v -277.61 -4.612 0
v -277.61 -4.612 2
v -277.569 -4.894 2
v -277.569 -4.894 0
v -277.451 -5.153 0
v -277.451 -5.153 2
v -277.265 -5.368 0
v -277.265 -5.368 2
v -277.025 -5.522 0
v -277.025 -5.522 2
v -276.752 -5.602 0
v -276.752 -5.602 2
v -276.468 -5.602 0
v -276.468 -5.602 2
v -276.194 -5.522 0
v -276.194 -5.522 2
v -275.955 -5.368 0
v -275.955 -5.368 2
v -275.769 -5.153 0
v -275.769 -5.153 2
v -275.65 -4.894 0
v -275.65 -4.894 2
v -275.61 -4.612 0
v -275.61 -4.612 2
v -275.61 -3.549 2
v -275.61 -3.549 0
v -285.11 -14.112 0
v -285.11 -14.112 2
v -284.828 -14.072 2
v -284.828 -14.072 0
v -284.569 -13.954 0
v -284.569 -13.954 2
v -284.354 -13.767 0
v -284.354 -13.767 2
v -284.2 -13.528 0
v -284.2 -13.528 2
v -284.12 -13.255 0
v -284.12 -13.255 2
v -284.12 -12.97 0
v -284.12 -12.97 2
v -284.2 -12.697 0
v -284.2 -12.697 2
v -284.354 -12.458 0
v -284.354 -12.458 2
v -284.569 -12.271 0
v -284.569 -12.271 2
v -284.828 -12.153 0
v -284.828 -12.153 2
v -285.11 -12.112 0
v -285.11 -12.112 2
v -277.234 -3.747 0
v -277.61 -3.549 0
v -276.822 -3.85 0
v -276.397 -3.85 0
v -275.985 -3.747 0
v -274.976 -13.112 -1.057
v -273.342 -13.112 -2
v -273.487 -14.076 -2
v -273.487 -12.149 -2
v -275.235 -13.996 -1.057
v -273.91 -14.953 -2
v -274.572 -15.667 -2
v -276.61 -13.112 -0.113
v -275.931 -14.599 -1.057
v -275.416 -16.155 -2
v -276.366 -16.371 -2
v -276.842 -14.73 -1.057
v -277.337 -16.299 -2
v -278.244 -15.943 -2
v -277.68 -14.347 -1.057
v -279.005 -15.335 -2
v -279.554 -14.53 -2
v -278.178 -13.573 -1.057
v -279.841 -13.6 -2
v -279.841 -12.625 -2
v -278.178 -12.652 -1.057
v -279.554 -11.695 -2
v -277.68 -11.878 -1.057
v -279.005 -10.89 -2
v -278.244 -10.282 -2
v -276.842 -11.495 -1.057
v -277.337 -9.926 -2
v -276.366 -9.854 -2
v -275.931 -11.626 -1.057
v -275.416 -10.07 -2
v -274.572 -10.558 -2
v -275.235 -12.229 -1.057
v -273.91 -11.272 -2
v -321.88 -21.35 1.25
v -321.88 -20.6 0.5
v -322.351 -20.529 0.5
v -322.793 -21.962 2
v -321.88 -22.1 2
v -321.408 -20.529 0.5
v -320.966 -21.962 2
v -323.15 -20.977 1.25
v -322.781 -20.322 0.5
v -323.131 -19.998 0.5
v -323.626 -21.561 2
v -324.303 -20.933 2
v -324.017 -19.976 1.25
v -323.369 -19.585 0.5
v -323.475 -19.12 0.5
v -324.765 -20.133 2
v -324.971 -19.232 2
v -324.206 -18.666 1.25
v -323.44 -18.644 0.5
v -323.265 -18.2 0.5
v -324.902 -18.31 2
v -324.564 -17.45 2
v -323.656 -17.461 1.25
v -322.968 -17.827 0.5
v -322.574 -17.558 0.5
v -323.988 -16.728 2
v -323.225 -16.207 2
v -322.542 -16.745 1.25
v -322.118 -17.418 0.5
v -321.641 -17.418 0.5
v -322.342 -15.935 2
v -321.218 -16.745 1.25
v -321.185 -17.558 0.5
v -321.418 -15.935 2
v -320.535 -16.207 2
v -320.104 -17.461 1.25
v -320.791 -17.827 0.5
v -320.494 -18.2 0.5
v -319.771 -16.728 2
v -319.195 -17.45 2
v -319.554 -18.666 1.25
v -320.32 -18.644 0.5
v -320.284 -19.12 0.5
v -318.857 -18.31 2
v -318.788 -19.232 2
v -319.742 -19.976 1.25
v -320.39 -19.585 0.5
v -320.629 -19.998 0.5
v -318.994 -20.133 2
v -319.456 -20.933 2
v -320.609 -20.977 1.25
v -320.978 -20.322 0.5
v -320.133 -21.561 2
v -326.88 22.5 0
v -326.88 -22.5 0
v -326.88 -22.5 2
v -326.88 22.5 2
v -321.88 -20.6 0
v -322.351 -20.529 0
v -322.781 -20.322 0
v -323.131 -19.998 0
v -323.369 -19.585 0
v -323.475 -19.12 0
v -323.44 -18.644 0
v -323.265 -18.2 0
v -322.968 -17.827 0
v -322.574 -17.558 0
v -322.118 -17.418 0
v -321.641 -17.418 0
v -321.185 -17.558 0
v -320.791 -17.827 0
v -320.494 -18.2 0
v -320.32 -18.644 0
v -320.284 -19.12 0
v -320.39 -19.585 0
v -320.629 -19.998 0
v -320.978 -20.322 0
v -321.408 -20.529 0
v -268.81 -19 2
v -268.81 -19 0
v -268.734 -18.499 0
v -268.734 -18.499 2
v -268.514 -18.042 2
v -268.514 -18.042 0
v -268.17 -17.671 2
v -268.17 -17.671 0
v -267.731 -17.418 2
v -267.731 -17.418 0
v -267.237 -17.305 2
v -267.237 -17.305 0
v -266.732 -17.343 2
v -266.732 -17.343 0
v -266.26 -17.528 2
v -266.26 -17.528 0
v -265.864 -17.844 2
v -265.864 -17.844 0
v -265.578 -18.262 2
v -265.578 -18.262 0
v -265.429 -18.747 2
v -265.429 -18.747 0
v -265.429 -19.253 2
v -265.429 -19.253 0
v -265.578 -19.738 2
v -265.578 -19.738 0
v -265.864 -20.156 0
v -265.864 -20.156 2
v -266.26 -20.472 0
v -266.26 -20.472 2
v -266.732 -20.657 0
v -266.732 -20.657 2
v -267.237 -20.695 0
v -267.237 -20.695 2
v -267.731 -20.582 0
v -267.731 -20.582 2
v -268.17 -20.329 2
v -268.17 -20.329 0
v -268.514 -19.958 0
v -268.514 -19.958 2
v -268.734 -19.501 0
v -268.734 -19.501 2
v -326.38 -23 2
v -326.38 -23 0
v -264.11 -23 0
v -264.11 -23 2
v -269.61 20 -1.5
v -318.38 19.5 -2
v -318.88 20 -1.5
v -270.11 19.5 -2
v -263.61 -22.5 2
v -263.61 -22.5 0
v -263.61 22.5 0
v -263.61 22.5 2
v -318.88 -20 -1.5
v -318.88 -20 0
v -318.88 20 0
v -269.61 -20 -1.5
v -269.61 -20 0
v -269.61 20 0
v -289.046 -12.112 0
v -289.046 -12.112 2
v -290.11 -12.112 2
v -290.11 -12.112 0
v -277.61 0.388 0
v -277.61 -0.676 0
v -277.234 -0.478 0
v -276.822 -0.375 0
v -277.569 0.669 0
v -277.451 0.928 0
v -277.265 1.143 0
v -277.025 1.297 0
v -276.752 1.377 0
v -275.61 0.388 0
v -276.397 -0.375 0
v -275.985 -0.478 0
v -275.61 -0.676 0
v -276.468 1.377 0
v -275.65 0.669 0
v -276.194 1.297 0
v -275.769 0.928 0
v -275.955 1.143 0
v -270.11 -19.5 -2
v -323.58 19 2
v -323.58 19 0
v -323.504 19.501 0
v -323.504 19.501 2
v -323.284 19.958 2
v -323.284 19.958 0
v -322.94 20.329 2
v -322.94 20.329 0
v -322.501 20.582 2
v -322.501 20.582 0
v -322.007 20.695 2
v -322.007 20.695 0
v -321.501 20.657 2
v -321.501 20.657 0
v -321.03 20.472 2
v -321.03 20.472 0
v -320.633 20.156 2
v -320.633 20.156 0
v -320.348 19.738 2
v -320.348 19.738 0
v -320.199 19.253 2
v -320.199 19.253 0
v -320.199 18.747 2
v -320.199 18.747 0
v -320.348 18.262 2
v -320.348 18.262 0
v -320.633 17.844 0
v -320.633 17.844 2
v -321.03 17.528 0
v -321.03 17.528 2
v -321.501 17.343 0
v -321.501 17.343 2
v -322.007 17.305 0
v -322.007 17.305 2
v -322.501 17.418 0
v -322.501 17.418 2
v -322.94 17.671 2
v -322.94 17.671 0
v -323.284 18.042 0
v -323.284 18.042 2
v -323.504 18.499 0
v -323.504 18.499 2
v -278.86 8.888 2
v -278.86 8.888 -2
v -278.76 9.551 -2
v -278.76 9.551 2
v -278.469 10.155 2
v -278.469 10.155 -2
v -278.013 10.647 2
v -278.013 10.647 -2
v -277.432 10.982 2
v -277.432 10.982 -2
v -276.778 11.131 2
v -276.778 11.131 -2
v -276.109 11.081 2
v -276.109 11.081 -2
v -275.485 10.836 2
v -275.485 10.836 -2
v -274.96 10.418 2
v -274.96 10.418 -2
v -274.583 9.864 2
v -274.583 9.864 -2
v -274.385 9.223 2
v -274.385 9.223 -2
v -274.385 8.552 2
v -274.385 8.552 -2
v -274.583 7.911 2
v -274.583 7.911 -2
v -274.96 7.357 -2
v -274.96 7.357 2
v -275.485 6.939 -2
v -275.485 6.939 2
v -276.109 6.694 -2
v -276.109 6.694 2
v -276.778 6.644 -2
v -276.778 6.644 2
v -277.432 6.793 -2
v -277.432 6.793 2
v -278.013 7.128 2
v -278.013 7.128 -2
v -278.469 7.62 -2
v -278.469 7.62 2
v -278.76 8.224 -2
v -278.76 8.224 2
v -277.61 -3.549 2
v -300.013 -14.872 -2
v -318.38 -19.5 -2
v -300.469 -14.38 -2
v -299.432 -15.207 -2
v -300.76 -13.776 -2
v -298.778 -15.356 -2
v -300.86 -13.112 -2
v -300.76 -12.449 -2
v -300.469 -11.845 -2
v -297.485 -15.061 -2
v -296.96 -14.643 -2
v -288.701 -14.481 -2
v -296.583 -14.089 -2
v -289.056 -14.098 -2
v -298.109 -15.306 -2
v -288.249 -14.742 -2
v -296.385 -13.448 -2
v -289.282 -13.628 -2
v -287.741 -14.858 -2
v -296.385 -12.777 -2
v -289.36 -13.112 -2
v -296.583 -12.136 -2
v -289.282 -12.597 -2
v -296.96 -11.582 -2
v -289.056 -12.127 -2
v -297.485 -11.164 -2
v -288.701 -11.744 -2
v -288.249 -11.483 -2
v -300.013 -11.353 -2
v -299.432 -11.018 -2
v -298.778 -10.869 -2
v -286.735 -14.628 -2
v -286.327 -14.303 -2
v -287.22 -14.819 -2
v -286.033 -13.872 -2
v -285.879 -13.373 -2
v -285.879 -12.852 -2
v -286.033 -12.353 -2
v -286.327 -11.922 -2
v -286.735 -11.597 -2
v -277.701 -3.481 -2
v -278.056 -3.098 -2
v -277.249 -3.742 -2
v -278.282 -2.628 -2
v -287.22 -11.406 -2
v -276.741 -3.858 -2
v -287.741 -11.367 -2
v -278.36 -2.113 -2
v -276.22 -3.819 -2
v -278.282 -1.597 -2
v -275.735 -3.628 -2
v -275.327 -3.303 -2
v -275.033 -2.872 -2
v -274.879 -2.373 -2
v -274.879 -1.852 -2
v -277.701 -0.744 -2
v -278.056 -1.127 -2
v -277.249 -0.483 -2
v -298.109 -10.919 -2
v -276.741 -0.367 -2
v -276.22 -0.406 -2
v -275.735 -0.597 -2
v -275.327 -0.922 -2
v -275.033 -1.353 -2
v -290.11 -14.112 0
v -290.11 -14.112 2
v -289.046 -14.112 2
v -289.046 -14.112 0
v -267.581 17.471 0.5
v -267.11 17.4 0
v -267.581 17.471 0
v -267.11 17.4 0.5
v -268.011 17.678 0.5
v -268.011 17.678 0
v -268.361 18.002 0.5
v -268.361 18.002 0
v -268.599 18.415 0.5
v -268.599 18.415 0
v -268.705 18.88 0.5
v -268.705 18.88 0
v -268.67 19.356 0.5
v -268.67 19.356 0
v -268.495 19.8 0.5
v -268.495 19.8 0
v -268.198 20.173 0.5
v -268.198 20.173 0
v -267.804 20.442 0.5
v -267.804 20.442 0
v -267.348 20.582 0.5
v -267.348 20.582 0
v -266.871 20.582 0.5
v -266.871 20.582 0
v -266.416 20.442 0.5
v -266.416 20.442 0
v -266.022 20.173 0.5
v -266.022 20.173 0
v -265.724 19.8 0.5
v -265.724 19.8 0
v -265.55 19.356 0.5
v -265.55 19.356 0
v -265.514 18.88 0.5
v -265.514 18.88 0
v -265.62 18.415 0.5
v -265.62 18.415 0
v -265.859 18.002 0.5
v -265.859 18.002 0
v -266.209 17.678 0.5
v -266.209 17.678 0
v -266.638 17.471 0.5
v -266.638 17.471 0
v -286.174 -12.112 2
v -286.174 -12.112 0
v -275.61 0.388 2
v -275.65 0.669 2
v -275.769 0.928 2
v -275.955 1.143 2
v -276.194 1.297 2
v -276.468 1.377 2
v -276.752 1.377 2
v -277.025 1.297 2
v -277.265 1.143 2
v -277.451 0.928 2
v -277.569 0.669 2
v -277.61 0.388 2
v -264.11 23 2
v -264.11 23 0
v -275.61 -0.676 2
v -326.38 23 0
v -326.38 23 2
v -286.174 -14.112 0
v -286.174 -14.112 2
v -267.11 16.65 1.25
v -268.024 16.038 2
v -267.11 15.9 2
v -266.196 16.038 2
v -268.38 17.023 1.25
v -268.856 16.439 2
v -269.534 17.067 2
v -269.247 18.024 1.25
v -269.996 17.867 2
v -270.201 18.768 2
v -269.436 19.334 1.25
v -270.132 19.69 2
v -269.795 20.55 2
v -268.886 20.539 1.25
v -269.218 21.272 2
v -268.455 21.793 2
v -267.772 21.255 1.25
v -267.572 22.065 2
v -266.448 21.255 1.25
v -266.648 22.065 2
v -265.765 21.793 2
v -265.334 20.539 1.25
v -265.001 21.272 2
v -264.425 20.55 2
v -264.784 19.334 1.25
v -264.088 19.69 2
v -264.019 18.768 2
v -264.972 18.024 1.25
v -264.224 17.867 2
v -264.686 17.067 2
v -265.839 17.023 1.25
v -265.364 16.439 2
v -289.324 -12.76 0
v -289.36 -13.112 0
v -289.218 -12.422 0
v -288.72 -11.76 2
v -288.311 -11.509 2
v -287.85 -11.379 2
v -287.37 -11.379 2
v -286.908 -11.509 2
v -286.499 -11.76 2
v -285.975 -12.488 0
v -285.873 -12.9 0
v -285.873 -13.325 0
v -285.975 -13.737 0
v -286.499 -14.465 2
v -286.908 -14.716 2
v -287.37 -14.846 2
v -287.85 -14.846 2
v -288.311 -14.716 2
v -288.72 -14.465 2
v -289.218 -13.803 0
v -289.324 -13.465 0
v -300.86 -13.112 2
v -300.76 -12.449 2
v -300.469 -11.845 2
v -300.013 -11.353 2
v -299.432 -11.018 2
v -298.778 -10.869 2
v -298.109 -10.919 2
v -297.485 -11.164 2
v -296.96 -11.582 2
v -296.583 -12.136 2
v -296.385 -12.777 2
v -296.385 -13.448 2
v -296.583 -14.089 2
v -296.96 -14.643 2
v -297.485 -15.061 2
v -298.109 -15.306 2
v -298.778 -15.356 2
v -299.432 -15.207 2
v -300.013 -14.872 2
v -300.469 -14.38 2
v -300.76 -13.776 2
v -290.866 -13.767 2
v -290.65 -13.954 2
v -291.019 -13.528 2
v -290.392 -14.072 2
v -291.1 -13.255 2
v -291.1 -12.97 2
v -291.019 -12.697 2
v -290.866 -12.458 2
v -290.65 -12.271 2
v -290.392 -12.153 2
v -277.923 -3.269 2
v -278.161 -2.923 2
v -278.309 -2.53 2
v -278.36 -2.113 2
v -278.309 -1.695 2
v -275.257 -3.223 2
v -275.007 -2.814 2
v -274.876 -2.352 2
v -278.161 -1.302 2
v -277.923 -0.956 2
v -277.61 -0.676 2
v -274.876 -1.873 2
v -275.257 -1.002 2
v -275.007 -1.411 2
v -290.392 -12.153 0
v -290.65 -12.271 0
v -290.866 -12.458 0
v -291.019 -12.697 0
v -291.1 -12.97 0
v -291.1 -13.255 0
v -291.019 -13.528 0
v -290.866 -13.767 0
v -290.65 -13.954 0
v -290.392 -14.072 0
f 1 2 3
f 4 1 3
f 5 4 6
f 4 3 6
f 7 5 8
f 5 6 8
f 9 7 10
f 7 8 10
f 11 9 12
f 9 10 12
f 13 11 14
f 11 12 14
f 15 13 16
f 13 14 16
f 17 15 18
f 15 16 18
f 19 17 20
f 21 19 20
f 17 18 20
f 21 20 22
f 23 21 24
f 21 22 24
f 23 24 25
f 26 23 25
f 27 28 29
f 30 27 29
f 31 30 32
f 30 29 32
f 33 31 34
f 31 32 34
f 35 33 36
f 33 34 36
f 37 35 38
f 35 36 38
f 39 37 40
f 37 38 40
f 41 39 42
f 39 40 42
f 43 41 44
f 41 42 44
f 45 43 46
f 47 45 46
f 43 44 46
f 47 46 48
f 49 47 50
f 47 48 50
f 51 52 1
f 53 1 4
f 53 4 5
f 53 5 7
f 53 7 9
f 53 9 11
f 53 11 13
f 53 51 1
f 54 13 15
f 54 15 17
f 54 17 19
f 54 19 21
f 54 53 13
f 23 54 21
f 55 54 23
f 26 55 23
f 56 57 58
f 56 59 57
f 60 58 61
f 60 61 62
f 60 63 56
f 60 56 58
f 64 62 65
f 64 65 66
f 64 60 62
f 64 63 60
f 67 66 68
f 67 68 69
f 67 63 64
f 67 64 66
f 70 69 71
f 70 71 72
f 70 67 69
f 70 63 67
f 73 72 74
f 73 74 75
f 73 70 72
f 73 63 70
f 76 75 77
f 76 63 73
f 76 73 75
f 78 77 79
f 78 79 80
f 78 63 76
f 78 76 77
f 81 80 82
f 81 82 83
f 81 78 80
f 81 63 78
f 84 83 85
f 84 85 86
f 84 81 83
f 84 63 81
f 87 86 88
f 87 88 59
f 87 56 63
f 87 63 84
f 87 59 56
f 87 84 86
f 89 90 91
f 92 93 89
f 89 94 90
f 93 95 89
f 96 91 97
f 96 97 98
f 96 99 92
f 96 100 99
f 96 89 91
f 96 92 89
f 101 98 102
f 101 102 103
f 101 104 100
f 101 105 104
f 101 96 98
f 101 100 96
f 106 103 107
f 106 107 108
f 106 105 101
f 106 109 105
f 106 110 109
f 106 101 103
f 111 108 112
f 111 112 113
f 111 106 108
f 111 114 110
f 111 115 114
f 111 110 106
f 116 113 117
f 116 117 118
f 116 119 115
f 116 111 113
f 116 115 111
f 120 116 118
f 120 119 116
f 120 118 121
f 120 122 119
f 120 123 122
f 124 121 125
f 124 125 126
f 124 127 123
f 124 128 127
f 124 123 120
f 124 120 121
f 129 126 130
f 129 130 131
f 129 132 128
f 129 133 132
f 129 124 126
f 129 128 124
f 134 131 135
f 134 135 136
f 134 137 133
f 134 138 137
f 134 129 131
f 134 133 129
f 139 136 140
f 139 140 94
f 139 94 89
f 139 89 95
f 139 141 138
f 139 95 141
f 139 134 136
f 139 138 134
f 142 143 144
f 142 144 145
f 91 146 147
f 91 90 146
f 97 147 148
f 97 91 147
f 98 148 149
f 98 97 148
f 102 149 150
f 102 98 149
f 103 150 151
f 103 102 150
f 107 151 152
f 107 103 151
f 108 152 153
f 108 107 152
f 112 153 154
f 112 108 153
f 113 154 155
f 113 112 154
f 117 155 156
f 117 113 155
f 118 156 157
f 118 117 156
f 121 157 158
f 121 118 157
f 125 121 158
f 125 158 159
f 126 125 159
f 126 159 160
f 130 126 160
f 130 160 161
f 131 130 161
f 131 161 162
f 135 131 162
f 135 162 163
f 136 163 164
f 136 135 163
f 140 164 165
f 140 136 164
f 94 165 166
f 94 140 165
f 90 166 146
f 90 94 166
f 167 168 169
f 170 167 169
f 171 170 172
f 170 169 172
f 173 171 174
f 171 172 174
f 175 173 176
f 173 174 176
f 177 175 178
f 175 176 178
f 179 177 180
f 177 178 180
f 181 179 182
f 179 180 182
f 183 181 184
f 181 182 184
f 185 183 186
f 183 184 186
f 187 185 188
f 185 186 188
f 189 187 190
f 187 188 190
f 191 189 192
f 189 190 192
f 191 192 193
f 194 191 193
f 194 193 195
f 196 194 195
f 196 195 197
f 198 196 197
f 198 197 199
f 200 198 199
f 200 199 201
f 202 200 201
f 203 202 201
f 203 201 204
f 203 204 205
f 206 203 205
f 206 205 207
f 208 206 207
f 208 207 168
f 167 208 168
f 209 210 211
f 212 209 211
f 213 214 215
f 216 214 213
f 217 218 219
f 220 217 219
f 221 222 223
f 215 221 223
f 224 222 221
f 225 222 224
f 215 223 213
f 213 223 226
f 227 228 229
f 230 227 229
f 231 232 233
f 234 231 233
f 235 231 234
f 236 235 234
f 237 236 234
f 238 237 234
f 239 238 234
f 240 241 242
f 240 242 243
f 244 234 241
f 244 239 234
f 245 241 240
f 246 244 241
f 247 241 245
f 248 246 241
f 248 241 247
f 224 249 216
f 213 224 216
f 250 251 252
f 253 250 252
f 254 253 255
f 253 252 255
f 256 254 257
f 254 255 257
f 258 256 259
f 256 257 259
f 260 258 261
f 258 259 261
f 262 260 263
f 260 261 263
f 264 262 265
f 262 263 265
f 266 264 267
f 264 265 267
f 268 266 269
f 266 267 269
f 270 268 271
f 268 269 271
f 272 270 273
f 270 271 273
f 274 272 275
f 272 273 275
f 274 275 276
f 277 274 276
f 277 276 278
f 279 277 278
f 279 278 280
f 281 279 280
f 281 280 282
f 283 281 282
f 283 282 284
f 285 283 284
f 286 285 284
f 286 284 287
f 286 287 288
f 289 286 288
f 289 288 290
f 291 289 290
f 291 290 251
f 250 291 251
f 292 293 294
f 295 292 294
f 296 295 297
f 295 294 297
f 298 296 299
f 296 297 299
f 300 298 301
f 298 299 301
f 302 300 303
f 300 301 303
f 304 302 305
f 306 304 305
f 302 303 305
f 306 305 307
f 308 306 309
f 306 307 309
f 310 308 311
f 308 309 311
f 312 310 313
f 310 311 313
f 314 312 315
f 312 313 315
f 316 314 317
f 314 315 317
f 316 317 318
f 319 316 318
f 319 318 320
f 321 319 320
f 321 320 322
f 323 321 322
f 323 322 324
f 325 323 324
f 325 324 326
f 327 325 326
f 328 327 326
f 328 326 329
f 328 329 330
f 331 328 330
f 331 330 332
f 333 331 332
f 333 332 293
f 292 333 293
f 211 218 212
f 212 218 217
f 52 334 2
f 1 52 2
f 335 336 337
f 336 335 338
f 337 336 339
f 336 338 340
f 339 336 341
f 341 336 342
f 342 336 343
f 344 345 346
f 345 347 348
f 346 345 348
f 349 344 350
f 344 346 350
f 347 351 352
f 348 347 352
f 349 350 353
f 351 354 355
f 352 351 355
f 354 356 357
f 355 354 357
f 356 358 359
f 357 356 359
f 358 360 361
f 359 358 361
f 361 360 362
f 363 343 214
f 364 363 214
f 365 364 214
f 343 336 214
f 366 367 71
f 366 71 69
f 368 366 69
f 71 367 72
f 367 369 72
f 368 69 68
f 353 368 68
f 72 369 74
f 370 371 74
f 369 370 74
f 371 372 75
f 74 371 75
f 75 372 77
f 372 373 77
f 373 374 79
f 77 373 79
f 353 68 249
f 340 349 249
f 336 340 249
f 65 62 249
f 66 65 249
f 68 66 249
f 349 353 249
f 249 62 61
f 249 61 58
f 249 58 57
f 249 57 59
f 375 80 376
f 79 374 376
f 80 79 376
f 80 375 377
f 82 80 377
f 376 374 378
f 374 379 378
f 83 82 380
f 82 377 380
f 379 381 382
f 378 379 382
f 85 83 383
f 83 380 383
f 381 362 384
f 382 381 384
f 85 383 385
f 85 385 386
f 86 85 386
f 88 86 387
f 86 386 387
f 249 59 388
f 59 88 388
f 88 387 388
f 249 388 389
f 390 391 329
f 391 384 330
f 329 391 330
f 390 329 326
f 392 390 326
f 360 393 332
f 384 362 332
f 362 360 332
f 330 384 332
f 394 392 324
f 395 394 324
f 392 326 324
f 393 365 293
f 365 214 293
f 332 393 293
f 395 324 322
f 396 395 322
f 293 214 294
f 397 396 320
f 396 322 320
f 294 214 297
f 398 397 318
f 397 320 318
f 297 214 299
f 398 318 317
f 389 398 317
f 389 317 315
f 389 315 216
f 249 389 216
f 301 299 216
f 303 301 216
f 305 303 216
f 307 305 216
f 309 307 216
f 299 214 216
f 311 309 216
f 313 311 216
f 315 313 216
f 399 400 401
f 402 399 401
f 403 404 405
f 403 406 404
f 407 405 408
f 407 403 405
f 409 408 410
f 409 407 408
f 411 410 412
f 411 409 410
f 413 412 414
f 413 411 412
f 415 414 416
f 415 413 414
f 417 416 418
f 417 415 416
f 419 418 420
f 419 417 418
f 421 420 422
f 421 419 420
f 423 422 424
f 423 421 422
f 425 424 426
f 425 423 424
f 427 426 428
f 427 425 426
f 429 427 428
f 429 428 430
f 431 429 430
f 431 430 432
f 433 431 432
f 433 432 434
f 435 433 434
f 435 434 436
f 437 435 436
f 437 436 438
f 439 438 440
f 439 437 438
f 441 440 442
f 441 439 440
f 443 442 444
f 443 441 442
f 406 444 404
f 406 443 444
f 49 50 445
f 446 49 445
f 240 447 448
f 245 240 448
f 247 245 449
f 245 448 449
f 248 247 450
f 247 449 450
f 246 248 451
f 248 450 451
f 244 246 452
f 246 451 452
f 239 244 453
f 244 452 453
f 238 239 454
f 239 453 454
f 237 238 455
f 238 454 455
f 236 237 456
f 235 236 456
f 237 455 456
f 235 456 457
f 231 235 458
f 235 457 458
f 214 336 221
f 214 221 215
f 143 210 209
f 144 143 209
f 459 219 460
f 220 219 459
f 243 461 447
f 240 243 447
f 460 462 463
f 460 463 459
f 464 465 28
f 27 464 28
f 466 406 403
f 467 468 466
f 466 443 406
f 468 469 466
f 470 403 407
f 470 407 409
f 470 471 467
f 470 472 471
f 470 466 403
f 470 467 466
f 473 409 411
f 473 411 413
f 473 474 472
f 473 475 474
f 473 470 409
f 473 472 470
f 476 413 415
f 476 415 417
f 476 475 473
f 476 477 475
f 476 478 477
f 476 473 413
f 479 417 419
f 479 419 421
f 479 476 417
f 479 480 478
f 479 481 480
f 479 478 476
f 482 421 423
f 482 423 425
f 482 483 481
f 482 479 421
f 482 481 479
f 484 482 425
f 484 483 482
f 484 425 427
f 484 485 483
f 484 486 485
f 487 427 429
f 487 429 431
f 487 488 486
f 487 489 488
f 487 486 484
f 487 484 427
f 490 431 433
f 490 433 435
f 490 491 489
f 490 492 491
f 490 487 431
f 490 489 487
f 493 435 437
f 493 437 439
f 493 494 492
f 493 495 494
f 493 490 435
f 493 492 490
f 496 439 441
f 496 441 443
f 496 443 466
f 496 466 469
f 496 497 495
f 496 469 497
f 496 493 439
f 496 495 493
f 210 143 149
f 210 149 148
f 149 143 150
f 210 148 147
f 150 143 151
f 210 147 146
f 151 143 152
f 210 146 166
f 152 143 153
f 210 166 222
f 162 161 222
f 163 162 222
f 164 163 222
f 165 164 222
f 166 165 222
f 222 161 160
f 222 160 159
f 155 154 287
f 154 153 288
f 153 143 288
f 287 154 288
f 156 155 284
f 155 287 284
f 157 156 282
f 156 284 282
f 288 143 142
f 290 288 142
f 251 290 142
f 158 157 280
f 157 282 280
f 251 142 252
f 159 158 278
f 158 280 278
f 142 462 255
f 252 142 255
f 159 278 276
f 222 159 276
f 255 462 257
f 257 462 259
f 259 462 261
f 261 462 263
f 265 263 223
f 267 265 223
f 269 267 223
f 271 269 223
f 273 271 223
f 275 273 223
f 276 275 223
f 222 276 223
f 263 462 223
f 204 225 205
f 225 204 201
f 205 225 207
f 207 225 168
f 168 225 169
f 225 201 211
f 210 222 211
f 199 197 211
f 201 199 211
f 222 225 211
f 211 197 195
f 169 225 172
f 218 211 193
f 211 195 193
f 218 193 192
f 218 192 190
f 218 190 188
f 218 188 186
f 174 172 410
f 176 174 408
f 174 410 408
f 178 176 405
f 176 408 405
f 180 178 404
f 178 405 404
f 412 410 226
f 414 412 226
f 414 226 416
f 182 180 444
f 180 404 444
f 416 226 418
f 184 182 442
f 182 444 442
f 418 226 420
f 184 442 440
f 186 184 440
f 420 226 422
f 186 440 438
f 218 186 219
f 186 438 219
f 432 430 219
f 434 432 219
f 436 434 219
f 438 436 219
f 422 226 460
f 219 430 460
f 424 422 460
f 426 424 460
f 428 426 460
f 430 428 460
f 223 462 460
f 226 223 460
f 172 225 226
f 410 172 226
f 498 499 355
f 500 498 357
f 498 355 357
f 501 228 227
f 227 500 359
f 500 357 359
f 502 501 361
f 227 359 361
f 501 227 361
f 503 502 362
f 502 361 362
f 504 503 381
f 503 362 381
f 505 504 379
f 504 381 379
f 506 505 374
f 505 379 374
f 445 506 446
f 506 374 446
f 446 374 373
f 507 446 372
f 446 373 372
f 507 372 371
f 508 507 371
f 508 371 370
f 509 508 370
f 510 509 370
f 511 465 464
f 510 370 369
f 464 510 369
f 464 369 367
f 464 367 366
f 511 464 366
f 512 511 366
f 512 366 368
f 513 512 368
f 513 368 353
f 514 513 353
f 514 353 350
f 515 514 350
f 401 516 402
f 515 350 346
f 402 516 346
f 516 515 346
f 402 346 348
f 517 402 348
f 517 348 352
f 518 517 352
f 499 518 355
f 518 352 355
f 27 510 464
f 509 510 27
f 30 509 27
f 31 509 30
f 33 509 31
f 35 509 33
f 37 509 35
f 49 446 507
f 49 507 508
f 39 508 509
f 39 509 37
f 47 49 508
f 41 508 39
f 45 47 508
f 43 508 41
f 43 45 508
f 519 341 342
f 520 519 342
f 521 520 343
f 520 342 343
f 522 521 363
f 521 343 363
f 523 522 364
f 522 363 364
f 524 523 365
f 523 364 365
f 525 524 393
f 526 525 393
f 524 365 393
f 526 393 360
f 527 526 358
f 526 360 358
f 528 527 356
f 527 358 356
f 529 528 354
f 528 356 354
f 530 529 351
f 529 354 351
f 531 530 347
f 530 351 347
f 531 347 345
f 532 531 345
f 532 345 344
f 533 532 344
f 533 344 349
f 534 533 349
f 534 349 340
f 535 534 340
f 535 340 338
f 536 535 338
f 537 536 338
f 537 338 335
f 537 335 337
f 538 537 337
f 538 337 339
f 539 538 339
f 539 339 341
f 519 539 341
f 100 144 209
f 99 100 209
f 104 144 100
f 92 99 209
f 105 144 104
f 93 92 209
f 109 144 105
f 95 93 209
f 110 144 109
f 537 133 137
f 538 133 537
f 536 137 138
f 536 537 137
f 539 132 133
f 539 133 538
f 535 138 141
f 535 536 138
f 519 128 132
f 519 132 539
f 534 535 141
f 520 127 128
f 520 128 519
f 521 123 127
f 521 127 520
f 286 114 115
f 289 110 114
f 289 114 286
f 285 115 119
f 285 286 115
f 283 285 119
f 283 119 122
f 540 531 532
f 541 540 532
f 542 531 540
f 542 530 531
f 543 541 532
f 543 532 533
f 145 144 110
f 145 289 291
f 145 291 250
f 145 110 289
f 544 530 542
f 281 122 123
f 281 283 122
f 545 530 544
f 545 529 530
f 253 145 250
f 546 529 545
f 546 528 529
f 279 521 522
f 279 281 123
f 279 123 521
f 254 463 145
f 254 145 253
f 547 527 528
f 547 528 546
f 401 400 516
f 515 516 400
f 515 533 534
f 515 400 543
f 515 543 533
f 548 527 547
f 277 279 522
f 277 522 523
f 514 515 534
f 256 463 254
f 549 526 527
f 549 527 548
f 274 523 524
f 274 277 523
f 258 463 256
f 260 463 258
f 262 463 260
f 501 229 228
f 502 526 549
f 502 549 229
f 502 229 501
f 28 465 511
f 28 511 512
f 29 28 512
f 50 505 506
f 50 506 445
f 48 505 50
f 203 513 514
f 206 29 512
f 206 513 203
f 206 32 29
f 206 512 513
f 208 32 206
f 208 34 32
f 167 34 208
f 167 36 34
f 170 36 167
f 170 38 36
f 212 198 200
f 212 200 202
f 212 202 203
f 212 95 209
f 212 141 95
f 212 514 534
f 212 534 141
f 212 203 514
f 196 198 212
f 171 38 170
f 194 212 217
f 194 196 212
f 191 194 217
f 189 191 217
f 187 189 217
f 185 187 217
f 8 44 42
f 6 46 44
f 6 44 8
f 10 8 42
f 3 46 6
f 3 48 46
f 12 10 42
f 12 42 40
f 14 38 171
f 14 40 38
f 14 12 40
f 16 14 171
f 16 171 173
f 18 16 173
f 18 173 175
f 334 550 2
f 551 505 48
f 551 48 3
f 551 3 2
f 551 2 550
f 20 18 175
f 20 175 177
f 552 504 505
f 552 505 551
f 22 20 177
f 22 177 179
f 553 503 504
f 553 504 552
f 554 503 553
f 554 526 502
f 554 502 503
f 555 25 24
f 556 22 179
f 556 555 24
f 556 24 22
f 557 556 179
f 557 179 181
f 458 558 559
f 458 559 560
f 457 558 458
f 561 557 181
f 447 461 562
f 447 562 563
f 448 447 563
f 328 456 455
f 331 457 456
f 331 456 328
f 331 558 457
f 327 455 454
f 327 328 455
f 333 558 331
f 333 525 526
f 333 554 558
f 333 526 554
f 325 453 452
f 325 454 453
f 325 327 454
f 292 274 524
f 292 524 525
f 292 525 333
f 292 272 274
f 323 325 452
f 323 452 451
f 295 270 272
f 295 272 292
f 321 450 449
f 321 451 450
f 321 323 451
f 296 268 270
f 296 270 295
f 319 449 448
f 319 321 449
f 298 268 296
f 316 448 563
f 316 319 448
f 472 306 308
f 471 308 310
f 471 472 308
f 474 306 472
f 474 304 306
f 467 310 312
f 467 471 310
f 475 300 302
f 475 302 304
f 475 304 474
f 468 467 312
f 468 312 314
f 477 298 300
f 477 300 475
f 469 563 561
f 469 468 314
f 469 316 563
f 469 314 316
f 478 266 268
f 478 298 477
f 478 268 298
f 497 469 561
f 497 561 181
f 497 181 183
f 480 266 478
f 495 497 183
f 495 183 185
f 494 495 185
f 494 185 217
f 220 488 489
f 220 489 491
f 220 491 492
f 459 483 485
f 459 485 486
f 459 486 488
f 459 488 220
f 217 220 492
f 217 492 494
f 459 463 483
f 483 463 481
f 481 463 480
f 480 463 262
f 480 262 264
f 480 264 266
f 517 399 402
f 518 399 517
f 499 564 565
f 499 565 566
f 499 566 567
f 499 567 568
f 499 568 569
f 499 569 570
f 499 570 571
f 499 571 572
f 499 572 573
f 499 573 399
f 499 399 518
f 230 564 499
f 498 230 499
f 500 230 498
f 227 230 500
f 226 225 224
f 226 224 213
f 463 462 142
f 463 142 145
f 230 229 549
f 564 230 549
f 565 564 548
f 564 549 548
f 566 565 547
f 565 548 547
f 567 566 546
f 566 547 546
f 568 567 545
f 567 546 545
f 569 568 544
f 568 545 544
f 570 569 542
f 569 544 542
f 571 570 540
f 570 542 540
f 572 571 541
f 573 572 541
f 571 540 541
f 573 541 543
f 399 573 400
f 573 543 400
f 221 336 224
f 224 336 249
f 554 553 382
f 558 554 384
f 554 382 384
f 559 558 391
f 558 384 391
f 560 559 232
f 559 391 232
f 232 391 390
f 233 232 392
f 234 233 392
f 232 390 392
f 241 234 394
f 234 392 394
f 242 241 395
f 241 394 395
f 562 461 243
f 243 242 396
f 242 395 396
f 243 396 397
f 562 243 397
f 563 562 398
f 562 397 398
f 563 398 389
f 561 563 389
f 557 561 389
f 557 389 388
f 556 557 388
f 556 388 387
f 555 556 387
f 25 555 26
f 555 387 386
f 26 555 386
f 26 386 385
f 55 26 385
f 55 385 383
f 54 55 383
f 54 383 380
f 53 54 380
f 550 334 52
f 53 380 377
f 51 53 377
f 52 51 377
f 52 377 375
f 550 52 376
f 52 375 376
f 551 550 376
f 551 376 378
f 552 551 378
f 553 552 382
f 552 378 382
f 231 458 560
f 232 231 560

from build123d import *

# Parameters (mm, degrees)
SKICA1_W                                  = 49.2698
SKICA1_H                                  = 40
P_IDAT_VYSUNUT_M1_DEPTH                   = 2
ZKOSEN_1_SIZE                             = 0.5
SKICA4_W                                  = 63.2698
SKICA4_H                                  = 46
P_IDAT_VYSUNUT_M2_DEPTH                   = 2
KU_ELOV_ZAHLOUBEN_PRO_M3_ROUBU_SE_2_COUNT = 2
KU_ELOV_ZAHLOUBEN_PRO_M3_ROUBU_SE_2_PITCH = 66.661315559
F_3_4_3_4_PR_M_R_D_RY1_D                  = 3.4
F_3_4_3_4_PR_M_R_D_RY1_DEPTH              = 2
ODEBRAT_VYSUNUT_M1_DEPTH                  = 2
F_3_5_3_5_PR_M_R_D_RY1_D                  = 3.5
F_3_5_3_5_PR_M_R_D_RY1_DEPTH              = 4
F_4_5_4_5_PR_M_R_D_RY1_D                  = 4.5
F_4_5_4_5_PR_M_R_D_RY1_DEPTH              = 4
ZKOSEN_2_SIZE                             = 0.5


with BuildPart() as part:
    # Skica1 → Přidat vysunutím1 (new body)
    with BuildSketch(Plane.XY):
        with Locations((-294.244757855, 0)):
            Rectangle(SKICA1_W, SKICA1_H)
    extrude(amount=-P_IDAT_VYSUNUT_M1_DEPTH)

    # Zkosení1
    zkosen_1_edges = [part.edges().sort_by_distance(p)[0] for p in [
        (-269.609857855, 0, -2),
        (-294.244757855, 20, -2),
        (-318.879657855, 0, -2),
        (-294.244757855, -20, -2),
    ]]
    chamfer(zkosen_1_edges, length=ZKOSEN_1_SIZE)

    # Skica3 → Odebrat rotací2 (revolve, cut)
    with BuildSketch(Plane(origin=(0, -13.1125, 0), x_dir=(-1, 0, 0), z_dir=(0, -1, 0))):
        Polygon((273.341908662, 2), (276.609857855, 0.113248654), (276.609857855, 2), align=None)
    revolve(axis=Axis((-276.609857855, -13.1125, -0.113248654), (0, 0, -1)), mode=Mode.SUBTRACT)

    # Skica4 → Přidat vysunutím2 (add)
    with BuildSketch(Plane.XY):
        with Locations((-295.244757855, 0)):
            Rectangle(SKICA4_W, SKICA4_H)
    extrude(amount=P_IDAT_VYSUNUT_M2_DEPTH)

    # Skica7 → Kuželové zahloubení pro M3 šroubu se zápustnou hlavou plochou1 (revolve, cut)
    with BuildSketch(Plane(origin=(-321.879657855, -19, 2), x_dir=(0, -1, 0), z_dir=(1, 0, 0))):
        Polygon((0, 0), (0, 2), (1.6, 2), (1.6, 1.5), (3.1, 0), align=None)
    ku_elov_zahlouben_pro_m3_roubu_se_z_p = revolve(axis=Axis((-321.879657855, -19, 8.35), (0, 0, -1)), mode=Mode.SUBTRACT)

    # Ku_elov_ zahlouben_ pro M3 _roubu se 2: Kuželové zahloubení pro M3 šroubu se zápustnou hlavou plochou1 ×2
    with Locations(*[Vector(0.821612948, 0.570045756, 0) * (i * KU_ELOV_ZAHLOUBEN_PRO_M3_ROUBU_SE_2_PITCH) for i in range(1, KU_ELOV_ZAHLOUBEN_PRO_M3_ROUBU_SE_2_COUNT)]):
        add(ku_elov_zahlouben_pro_m3_roubu_se_z_p, mode=Mode.SUBTRACT)

    # Ø3.4 (3.4) průměr díry1
    with Locations(Plane(origin=(-267.109857855, -19, 2), x_dir=(1, 0, 0), z_dir=(0, 0, 1))):
        with Locations((0, 0), (-54.7698, 38)):
            Hole(F_3_4_3_4_PR_M_R_D_RY1_D / 2, depth=F_3_4_3_4_PR_M_R_D_RY1_DEPTH)

    # Skica9 → Odebrat vysunutím1 (cut)
    with BuildSketch(Plane.XY.offset(2)):
        with BuildLine():
            Line((-290.109857855, -14.1125), (-285.109857855, -14.1125))
            ThreePointArc((-285.109857855, -14.1125), (-284.109857855, -13.1125), (-285.109857855, -12.1125))
            Line((-285.109857855, -12.1125), (-290.109857855, -12.1125))
            ThreePointArc((-290.109857855, -12.1125), (-291.109857855, -13.1125), (-290.109857855, -14.1125))
        make_face()
        with BuildLine():
            Line((-277.609857855, 0.3875), (-277.609857855, -4.6125))
            ThreePointArc((-277.609857855, -4.6125), (-276.609857855, -5.6125), (-275.609857855, -4.6125))
            Line((-275.609857855, -4.6125), (-275.609857855, 0.3875))
            ThreePointArc((-275.609857855, 0.3875), (-276.609857855, 1.3875), (-277.609857855, 0.3875))
        make_face()
    extrude(amount=-ODEBRAT_VYSUNUT_M1_DEPTH, mode=Mode.SUBTRACT)

    # Ø3.5 (3.5) průměr díry1
    with Locations(Plane(origin=(-287.609857855, -13.1125, 2), x_dir=(1, 0, 0), z_dir=(0, 0, 1))):
        with Locations((0, 0), (11, 11)):
            Hole(F_3_5_3_5_PR_M_R_D_RY1_D / 2, depth=F_3_5_3_5_PR_M_R_D_RY1_DEPTH)

    # Ø4.5 (4.5) průměr díry1
    with Locations(Plane(origin=(-276.609857855, 8.8875, 2), x_dir=(1, 0, 0), z_dir=(0, 0, 1))):
        with Locations((0, 0), (-22, -22)):
            Hole(F_4_5_4_5_PR_M_R_D_RY1_D / 2, depth=F_4_5_4_5_PR_M_R_D_RY1_DEPTH)

    # Zkosení2
    zkosen_2_edges = [part.edges().sort_by_distance(p)[0] for p in [
        (-263.609857855, -23, 1),
        (-263.609857855, 23, 1),
        (-326.879657855, 23, 1),
        (-326.879657855, -23, 1),
    ]]
    chamfer(zkosen_2_edges, length=ZKOSEN_2_SIZE)


solid = part.part
